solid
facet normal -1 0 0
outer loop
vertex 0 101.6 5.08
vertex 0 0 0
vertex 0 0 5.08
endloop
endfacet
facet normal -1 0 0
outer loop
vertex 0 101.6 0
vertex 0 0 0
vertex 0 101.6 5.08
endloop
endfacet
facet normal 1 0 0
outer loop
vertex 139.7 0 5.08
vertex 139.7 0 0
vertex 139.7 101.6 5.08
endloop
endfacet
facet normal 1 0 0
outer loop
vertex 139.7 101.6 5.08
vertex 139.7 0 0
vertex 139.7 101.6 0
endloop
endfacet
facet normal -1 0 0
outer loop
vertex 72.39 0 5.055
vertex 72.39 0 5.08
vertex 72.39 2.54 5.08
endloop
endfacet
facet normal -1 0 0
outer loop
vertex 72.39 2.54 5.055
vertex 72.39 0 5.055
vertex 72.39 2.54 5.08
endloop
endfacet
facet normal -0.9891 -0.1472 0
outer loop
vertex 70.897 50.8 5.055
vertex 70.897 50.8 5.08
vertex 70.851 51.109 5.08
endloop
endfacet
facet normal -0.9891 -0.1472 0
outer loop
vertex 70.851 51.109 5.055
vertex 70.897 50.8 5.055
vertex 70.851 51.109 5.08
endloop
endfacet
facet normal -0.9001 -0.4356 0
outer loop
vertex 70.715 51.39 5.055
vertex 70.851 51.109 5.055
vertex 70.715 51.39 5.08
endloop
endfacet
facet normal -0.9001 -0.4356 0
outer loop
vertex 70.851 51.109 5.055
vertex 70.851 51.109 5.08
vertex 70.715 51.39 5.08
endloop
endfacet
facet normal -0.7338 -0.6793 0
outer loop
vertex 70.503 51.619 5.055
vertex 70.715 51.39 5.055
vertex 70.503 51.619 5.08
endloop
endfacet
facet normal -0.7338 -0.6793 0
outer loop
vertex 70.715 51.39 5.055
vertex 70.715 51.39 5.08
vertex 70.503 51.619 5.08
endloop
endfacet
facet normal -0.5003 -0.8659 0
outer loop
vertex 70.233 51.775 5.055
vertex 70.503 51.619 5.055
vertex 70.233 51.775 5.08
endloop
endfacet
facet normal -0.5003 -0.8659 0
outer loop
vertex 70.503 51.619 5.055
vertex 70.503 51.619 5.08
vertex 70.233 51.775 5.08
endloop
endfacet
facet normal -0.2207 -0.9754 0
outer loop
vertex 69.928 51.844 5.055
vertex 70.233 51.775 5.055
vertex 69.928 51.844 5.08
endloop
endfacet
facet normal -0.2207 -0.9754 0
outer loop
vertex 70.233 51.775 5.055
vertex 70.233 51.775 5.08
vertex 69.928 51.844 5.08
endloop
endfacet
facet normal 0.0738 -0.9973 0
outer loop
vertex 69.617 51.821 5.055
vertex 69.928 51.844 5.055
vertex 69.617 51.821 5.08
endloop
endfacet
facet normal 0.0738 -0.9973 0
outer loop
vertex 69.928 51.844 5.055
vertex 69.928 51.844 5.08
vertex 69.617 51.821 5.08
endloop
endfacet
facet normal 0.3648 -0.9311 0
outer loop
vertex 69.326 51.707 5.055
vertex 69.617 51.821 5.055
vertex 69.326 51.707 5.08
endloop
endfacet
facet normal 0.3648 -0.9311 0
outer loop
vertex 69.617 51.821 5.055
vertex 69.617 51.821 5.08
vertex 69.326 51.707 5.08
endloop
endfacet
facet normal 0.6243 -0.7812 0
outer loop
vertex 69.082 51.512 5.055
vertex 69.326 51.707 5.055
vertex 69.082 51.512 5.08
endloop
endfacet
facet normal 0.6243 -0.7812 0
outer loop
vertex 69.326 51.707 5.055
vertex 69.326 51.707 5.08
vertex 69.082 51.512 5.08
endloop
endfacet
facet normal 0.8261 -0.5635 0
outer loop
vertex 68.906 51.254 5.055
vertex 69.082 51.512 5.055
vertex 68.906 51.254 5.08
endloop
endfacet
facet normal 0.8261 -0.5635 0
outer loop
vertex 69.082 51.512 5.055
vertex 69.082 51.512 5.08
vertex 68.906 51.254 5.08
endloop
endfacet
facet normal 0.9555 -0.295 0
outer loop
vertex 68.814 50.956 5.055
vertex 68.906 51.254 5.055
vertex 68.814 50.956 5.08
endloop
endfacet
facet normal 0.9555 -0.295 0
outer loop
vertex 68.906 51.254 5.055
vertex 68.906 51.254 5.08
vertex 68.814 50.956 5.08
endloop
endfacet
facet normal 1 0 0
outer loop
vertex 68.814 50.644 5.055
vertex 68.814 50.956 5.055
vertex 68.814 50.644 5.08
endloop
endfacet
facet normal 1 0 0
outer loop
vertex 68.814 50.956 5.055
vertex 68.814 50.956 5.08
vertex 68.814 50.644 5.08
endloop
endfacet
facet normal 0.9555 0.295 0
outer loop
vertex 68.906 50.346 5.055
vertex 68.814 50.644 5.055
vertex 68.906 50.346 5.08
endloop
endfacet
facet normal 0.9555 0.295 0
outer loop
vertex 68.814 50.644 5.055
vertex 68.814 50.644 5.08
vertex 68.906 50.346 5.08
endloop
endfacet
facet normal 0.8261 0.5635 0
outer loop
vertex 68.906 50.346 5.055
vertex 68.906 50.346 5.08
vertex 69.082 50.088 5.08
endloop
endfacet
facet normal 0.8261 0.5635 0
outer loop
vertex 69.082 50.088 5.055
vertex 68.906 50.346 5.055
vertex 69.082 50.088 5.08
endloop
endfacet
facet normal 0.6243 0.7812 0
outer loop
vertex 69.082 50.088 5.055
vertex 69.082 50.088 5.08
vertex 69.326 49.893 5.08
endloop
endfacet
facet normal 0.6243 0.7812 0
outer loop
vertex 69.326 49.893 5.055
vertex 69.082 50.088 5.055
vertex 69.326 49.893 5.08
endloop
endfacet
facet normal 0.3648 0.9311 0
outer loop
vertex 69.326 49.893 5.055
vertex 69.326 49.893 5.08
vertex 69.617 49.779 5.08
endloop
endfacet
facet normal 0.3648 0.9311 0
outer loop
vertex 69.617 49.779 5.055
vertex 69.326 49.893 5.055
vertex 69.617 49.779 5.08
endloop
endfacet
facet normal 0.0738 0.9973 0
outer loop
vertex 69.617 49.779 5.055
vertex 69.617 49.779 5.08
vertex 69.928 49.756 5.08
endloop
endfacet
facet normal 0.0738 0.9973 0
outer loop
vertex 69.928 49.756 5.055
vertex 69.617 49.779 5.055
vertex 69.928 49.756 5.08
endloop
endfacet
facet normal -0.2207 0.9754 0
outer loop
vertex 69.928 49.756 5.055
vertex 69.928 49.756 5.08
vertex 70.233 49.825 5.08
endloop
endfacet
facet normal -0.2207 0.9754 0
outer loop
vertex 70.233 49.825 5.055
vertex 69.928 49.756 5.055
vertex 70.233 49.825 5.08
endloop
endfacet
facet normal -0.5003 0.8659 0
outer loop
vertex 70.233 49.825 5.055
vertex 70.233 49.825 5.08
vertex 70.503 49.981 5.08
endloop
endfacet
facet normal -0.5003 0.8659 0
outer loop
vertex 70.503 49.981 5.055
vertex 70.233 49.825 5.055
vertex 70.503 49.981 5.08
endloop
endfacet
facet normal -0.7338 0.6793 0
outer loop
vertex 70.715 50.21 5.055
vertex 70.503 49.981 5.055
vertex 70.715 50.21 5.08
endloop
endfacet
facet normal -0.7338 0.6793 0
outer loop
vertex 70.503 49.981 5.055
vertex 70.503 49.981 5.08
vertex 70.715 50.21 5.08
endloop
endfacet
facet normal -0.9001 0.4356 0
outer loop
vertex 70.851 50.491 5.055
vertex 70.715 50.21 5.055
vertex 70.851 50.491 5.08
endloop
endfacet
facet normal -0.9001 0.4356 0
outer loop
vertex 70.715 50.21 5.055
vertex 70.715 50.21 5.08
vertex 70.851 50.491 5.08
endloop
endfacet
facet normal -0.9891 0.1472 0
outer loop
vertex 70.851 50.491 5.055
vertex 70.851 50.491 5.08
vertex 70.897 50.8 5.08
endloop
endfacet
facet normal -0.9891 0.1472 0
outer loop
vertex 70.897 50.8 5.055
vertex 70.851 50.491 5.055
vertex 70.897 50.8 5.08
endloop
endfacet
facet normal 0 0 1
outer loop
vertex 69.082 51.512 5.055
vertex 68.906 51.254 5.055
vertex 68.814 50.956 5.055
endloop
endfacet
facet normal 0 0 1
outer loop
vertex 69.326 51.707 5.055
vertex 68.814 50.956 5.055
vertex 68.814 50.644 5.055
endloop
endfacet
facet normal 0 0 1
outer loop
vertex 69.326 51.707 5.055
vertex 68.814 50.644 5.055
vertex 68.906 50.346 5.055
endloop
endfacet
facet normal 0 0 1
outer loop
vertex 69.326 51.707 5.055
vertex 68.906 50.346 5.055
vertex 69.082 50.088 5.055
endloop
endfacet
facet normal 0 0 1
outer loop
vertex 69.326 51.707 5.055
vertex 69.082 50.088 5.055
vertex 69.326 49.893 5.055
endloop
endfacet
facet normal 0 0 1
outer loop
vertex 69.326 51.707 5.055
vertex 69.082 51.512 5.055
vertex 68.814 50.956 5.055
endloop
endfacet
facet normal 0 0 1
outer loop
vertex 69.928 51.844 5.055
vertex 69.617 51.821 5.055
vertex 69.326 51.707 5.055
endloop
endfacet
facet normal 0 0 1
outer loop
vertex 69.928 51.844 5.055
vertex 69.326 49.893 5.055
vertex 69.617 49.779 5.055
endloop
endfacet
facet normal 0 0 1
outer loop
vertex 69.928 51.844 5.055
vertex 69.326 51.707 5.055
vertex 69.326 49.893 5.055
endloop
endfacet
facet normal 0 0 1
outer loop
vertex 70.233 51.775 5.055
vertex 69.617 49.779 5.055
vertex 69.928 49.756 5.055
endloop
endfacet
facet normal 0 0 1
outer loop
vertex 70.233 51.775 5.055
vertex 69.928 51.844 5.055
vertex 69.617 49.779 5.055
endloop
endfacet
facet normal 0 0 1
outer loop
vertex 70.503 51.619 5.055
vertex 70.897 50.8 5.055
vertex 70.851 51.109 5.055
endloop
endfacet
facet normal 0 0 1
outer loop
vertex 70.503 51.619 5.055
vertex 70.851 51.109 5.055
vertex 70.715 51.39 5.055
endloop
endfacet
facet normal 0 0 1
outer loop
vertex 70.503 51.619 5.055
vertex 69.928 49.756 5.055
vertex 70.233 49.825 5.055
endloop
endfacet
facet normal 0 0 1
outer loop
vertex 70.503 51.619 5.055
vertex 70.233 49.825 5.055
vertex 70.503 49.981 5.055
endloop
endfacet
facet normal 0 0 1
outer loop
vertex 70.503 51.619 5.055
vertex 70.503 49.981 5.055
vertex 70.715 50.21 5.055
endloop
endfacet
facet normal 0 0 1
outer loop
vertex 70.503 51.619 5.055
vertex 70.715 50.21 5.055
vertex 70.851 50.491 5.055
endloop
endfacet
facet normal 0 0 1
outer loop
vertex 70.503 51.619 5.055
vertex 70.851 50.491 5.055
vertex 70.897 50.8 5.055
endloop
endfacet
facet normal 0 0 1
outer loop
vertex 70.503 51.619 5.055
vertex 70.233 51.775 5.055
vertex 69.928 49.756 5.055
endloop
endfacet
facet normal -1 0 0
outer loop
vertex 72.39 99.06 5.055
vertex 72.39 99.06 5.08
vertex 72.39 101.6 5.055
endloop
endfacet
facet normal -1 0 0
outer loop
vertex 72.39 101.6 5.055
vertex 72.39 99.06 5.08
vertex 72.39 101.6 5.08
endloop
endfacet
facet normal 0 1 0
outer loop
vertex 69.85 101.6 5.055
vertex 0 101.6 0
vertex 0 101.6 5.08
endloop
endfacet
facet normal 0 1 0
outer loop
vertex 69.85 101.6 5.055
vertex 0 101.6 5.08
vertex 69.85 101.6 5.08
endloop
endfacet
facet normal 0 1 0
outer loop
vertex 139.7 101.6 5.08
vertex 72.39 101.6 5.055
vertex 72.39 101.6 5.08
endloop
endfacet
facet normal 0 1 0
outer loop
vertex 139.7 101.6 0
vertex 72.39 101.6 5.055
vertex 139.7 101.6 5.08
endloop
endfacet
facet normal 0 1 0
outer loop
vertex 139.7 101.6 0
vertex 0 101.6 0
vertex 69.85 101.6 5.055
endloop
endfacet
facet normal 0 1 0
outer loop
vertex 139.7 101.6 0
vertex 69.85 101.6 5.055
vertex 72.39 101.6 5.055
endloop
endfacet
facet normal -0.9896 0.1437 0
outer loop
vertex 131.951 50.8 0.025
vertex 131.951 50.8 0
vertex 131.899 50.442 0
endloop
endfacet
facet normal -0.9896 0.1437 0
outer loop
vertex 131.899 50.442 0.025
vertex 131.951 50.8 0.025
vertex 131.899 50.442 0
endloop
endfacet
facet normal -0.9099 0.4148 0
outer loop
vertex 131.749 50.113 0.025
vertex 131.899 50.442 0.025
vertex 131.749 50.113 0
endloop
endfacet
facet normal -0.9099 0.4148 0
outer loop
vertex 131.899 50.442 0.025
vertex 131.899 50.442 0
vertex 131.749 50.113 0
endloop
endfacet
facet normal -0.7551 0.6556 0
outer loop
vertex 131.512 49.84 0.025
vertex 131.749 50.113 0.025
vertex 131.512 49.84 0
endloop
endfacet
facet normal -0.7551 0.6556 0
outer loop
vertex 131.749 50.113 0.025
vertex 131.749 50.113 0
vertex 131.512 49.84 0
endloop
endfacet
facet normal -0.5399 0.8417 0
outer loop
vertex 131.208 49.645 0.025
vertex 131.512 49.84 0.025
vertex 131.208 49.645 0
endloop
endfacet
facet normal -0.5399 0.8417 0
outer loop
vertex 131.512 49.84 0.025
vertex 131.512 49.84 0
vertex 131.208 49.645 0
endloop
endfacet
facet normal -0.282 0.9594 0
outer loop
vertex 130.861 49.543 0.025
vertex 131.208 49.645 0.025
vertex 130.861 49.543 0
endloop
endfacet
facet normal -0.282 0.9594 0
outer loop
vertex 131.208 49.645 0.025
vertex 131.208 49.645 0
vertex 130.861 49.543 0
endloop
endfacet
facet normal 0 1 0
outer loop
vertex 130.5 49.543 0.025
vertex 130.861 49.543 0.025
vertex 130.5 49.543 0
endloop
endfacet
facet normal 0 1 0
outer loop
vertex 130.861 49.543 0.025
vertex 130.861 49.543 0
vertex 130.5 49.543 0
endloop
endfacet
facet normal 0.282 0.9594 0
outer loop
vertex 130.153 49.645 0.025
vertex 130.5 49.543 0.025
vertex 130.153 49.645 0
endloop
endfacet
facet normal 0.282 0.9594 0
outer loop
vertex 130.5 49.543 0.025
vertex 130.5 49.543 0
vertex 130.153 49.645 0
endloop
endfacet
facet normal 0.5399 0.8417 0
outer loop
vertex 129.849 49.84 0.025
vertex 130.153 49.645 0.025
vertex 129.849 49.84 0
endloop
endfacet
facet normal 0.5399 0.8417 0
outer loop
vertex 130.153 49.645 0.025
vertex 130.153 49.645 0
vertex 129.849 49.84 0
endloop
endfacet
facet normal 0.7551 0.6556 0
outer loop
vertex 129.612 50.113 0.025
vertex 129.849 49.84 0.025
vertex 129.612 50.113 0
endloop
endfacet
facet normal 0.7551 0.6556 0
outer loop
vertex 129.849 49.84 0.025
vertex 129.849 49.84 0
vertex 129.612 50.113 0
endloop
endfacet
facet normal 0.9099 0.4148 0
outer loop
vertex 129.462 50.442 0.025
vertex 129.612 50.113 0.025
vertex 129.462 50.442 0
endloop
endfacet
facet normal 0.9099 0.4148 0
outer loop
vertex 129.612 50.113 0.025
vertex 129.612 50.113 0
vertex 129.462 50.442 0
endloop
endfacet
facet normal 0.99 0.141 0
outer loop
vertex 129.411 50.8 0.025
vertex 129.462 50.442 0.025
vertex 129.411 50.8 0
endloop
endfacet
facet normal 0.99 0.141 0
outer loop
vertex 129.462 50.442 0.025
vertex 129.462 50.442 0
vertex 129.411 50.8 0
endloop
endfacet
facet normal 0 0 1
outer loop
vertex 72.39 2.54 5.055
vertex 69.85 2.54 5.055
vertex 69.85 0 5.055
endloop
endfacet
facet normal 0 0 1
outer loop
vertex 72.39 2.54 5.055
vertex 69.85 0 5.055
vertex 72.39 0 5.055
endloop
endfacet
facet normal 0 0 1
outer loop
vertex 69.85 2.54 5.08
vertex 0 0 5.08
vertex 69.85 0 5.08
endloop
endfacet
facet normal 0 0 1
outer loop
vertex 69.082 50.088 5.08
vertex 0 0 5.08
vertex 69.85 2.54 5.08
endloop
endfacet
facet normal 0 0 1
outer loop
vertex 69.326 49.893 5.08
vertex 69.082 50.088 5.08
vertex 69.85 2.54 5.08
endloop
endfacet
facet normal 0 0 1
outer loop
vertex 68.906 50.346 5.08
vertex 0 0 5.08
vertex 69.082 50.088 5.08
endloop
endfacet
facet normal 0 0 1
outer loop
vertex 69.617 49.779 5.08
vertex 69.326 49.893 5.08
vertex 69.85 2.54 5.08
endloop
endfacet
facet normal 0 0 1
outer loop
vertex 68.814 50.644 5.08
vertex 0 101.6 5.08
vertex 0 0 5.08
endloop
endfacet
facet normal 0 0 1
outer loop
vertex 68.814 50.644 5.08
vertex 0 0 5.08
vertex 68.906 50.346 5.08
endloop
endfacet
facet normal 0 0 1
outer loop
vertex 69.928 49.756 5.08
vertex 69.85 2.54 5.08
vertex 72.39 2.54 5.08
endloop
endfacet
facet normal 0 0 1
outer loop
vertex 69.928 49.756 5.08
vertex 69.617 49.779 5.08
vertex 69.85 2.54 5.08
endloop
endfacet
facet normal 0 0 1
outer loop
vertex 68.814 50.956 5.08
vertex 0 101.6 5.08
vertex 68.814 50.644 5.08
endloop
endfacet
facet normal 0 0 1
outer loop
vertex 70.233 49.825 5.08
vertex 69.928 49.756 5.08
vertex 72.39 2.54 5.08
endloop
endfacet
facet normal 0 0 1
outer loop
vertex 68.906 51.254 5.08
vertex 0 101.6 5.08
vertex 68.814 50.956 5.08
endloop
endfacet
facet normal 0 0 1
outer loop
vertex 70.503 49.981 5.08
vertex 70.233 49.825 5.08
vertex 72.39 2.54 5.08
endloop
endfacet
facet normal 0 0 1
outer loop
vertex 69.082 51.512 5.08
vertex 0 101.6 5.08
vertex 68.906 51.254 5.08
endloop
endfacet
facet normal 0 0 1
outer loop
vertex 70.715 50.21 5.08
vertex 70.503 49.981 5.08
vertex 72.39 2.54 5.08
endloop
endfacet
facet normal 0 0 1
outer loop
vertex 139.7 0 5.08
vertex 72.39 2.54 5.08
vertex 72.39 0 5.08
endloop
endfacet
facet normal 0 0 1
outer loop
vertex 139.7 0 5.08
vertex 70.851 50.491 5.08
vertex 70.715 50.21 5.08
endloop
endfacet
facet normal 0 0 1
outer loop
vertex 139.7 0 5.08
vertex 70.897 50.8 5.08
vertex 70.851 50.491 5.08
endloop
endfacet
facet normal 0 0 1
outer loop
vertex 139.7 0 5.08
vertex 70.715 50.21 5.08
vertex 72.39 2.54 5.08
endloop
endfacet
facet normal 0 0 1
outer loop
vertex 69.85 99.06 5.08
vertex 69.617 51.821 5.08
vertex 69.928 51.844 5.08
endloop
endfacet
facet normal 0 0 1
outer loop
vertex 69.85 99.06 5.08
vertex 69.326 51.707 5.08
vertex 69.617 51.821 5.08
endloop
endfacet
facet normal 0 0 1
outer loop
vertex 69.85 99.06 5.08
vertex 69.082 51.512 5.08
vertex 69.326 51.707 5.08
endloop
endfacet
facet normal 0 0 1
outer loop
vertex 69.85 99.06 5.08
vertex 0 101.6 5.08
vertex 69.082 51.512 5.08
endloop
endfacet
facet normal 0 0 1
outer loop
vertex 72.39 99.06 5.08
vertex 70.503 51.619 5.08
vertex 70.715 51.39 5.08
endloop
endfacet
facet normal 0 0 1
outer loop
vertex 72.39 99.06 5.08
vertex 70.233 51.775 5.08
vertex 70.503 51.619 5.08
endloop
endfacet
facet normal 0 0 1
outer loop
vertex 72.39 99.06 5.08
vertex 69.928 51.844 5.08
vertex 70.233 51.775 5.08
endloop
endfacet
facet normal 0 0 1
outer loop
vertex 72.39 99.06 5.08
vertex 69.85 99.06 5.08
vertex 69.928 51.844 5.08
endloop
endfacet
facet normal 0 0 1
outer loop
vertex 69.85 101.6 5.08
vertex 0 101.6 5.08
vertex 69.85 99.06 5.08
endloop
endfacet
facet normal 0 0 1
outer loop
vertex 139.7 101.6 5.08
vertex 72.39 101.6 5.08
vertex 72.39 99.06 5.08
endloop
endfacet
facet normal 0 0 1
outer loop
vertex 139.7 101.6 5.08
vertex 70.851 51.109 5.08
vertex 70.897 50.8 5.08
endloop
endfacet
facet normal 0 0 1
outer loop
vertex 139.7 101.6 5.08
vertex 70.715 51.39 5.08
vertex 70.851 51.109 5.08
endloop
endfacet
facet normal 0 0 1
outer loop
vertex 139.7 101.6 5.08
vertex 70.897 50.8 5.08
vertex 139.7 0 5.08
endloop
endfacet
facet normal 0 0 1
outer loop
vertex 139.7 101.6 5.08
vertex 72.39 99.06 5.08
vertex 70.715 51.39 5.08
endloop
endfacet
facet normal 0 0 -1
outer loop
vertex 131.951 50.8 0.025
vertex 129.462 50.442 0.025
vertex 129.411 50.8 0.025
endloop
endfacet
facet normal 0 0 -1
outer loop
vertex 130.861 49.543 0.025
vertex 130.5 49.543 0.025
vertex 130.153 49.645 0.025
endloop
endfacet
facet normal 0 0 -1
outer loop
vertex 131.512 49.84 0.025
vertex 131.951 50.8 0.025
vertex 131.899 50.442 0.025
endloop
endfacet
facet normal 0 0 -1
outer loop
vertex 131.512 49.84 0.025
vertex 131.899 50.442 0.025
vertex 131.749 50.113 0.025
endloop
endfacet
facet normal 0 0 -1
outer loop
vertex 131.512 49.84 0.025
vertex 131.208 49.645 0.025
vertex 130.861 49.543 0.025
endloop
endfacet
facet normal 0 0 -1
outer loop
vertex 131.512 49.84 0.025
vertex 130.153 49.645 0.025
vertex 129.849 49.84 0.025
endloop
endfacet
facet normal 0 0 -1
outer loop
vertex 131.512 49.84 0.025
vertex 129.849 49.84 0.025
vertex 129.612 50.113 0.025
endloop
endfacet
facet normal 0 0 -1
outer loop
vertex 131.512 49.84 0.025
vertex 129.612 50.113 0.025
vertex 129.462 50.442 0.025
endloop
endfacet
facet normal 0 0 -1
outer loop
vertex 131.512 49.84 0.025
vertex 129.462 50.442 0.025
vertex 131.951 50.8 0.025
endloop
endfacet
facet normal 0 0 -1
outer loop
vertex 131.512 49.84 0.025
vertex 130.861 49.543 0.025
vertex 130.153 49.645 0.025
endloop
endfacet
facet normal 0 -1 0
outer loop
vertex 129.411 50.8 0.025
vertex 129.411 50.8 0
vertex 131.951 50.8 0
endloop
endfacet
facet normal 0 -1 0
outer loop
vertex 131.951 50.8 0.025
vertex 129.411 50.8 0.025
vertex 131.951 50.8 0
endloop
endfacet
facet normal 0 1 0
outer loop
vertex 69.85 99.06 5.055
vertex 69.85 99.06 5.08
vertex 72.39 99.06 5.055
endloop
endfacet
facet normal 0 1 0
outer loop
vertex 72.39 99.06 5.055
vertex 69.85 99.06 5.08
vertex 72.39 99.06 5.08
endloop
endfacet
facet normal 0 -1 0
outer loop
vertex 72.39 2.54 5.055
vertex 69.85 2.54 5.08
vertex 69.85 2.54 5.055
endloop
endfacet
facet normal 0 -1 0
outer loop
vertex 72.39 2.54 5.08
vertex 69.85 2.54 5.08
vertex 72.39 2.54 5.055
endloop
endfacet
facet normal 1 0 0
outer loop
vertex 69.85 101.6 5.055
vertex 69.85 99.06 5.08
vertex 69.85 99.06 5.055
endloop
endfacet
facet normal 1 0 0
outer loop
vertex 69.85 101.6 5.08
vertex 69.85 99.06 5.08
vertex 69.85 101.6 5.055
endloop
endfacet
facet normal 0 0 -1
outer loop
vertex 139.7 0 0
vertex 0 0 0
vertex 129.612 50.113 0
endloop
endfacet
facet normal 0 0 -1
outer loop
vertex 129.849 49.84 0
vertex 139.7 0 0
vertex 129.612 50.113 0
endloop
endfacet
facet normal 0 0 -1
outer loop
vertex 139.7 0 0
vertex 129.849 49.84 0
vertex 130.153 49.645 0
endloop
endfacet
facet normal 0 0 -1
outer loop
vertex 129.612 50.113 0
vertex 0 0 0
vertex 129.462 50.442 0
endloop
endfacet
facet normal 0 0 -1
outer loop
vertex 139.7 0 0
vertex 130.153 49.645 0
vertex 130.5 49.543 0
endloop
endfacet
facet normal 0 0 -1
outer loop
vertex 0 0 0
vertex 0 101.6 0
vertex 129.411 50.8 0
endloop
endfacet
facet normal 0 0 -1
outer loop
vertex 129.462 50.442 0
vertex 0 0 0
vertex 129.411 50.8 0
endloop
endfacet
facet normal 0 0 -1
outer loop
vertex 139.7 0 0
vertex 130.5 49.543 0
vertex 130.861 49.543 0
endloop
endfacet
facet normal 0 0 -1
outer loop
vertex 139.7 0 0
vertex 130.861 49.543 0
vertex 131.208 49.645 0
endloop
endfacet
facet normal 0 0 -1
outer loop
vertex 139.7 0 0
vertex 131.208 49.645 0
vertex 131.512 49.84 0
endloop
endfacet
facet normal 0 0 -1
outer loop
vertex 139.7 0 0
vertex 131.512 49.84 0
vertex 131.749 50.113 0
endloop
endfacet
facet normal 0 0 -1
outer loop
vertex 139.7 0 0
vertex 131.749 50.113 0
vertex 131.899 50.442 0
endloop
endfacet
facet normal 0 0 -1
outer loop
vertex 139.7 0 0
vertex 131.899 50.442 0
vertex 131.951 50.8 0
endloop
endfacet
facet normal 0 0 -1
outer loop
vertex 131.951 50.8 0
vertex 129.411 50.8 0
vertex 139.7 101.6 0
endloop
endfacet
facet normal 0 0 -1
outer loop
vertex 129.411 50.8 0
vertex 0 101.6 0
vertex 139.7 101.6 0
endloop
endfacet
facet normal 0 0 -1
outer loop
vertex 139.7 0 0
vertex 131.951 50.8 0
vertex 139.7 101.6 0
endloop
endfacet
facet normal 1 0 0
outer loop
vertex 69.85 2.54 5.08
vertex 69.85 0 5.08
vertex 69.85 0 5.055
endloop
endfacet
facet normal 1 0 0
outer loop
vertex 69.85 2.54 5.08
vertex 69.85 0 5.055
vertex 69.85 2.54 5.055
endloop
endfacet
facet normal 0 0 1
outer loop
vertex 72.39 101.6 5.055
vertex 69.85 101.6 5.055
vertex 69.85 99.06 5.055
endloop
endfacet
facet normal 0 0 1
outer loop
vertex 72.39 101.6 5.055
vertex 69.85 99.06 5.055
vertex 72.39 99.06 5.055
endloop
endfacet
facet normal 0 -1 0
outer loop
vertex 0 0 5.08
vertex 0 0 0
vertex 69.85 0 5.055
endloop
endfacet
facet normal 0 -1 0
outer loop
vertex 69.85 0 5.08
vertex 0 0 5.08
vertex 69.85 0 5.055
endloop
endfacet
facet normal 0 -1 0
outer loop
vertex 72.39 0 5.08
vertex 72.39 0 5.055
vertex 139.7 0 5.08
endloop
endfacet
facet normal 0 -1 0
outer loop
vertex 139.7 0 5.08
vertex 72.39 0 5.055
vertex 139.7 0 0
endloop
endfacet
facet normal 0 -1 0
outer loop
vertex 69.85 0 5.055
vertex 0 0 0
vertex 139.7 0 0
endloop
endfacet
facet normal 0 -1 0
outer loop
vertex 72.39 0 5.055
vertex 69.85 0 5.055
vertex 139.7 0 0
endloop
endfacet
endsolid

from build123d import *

# Parameters (mm, degrees)
F0_W     = 139.7
F0_H     = 101.6
F1_DEPTH = 5.08
F2_W     = 2.54
F2_H     = 2.54
F2_R     = 1.0473849044
F3_DEPTH = 0.0254
F5_DEPTH = 0.0254


with BuildPart() as f1:
    # F0 (on Top) → F1 (new body)
    with BuildSketch(Plane.XY):
        with Locations((69.85, 50.8)):
            Rectangle(F0_W, F0_H)
    extrude(amount=F1_DEPTH)

    # F2 (on face) → F3 (cut)
    with BuildSketch(Plane.XY.offset(5.08)):
        with Locations((71.12, 1.27)):
            Rectangle(F2_W, F2_H)
        with Locations((71.12, 100.33)):
            Rectangle(F2_W, F2_H)
        with Locations((69.85, 50.8)):
            Circle(F2_R)
    extrude(amount=-F3_DEPTH, mode=Mode.SUBTRACT)

    # F4 (on face) → F5 (cut)
    with BuildSketch(Plane(origin=(0, 0, 0), x_dir=(1, 0, 0), z_dir=(0, 0, -1))):
        with BuildLine():
            Line((129.4106504726, -50.8), (131.9506504726, -50.8))
            ThreePointArc((131.9506504726, -50.8), (130.6806504726, -49.53), (129.4106504726, -50.8))
        make_face()
    extrude(amount=-F5_DEPTH, mode=Mode.SUBTRACT)


solid = f1.part
